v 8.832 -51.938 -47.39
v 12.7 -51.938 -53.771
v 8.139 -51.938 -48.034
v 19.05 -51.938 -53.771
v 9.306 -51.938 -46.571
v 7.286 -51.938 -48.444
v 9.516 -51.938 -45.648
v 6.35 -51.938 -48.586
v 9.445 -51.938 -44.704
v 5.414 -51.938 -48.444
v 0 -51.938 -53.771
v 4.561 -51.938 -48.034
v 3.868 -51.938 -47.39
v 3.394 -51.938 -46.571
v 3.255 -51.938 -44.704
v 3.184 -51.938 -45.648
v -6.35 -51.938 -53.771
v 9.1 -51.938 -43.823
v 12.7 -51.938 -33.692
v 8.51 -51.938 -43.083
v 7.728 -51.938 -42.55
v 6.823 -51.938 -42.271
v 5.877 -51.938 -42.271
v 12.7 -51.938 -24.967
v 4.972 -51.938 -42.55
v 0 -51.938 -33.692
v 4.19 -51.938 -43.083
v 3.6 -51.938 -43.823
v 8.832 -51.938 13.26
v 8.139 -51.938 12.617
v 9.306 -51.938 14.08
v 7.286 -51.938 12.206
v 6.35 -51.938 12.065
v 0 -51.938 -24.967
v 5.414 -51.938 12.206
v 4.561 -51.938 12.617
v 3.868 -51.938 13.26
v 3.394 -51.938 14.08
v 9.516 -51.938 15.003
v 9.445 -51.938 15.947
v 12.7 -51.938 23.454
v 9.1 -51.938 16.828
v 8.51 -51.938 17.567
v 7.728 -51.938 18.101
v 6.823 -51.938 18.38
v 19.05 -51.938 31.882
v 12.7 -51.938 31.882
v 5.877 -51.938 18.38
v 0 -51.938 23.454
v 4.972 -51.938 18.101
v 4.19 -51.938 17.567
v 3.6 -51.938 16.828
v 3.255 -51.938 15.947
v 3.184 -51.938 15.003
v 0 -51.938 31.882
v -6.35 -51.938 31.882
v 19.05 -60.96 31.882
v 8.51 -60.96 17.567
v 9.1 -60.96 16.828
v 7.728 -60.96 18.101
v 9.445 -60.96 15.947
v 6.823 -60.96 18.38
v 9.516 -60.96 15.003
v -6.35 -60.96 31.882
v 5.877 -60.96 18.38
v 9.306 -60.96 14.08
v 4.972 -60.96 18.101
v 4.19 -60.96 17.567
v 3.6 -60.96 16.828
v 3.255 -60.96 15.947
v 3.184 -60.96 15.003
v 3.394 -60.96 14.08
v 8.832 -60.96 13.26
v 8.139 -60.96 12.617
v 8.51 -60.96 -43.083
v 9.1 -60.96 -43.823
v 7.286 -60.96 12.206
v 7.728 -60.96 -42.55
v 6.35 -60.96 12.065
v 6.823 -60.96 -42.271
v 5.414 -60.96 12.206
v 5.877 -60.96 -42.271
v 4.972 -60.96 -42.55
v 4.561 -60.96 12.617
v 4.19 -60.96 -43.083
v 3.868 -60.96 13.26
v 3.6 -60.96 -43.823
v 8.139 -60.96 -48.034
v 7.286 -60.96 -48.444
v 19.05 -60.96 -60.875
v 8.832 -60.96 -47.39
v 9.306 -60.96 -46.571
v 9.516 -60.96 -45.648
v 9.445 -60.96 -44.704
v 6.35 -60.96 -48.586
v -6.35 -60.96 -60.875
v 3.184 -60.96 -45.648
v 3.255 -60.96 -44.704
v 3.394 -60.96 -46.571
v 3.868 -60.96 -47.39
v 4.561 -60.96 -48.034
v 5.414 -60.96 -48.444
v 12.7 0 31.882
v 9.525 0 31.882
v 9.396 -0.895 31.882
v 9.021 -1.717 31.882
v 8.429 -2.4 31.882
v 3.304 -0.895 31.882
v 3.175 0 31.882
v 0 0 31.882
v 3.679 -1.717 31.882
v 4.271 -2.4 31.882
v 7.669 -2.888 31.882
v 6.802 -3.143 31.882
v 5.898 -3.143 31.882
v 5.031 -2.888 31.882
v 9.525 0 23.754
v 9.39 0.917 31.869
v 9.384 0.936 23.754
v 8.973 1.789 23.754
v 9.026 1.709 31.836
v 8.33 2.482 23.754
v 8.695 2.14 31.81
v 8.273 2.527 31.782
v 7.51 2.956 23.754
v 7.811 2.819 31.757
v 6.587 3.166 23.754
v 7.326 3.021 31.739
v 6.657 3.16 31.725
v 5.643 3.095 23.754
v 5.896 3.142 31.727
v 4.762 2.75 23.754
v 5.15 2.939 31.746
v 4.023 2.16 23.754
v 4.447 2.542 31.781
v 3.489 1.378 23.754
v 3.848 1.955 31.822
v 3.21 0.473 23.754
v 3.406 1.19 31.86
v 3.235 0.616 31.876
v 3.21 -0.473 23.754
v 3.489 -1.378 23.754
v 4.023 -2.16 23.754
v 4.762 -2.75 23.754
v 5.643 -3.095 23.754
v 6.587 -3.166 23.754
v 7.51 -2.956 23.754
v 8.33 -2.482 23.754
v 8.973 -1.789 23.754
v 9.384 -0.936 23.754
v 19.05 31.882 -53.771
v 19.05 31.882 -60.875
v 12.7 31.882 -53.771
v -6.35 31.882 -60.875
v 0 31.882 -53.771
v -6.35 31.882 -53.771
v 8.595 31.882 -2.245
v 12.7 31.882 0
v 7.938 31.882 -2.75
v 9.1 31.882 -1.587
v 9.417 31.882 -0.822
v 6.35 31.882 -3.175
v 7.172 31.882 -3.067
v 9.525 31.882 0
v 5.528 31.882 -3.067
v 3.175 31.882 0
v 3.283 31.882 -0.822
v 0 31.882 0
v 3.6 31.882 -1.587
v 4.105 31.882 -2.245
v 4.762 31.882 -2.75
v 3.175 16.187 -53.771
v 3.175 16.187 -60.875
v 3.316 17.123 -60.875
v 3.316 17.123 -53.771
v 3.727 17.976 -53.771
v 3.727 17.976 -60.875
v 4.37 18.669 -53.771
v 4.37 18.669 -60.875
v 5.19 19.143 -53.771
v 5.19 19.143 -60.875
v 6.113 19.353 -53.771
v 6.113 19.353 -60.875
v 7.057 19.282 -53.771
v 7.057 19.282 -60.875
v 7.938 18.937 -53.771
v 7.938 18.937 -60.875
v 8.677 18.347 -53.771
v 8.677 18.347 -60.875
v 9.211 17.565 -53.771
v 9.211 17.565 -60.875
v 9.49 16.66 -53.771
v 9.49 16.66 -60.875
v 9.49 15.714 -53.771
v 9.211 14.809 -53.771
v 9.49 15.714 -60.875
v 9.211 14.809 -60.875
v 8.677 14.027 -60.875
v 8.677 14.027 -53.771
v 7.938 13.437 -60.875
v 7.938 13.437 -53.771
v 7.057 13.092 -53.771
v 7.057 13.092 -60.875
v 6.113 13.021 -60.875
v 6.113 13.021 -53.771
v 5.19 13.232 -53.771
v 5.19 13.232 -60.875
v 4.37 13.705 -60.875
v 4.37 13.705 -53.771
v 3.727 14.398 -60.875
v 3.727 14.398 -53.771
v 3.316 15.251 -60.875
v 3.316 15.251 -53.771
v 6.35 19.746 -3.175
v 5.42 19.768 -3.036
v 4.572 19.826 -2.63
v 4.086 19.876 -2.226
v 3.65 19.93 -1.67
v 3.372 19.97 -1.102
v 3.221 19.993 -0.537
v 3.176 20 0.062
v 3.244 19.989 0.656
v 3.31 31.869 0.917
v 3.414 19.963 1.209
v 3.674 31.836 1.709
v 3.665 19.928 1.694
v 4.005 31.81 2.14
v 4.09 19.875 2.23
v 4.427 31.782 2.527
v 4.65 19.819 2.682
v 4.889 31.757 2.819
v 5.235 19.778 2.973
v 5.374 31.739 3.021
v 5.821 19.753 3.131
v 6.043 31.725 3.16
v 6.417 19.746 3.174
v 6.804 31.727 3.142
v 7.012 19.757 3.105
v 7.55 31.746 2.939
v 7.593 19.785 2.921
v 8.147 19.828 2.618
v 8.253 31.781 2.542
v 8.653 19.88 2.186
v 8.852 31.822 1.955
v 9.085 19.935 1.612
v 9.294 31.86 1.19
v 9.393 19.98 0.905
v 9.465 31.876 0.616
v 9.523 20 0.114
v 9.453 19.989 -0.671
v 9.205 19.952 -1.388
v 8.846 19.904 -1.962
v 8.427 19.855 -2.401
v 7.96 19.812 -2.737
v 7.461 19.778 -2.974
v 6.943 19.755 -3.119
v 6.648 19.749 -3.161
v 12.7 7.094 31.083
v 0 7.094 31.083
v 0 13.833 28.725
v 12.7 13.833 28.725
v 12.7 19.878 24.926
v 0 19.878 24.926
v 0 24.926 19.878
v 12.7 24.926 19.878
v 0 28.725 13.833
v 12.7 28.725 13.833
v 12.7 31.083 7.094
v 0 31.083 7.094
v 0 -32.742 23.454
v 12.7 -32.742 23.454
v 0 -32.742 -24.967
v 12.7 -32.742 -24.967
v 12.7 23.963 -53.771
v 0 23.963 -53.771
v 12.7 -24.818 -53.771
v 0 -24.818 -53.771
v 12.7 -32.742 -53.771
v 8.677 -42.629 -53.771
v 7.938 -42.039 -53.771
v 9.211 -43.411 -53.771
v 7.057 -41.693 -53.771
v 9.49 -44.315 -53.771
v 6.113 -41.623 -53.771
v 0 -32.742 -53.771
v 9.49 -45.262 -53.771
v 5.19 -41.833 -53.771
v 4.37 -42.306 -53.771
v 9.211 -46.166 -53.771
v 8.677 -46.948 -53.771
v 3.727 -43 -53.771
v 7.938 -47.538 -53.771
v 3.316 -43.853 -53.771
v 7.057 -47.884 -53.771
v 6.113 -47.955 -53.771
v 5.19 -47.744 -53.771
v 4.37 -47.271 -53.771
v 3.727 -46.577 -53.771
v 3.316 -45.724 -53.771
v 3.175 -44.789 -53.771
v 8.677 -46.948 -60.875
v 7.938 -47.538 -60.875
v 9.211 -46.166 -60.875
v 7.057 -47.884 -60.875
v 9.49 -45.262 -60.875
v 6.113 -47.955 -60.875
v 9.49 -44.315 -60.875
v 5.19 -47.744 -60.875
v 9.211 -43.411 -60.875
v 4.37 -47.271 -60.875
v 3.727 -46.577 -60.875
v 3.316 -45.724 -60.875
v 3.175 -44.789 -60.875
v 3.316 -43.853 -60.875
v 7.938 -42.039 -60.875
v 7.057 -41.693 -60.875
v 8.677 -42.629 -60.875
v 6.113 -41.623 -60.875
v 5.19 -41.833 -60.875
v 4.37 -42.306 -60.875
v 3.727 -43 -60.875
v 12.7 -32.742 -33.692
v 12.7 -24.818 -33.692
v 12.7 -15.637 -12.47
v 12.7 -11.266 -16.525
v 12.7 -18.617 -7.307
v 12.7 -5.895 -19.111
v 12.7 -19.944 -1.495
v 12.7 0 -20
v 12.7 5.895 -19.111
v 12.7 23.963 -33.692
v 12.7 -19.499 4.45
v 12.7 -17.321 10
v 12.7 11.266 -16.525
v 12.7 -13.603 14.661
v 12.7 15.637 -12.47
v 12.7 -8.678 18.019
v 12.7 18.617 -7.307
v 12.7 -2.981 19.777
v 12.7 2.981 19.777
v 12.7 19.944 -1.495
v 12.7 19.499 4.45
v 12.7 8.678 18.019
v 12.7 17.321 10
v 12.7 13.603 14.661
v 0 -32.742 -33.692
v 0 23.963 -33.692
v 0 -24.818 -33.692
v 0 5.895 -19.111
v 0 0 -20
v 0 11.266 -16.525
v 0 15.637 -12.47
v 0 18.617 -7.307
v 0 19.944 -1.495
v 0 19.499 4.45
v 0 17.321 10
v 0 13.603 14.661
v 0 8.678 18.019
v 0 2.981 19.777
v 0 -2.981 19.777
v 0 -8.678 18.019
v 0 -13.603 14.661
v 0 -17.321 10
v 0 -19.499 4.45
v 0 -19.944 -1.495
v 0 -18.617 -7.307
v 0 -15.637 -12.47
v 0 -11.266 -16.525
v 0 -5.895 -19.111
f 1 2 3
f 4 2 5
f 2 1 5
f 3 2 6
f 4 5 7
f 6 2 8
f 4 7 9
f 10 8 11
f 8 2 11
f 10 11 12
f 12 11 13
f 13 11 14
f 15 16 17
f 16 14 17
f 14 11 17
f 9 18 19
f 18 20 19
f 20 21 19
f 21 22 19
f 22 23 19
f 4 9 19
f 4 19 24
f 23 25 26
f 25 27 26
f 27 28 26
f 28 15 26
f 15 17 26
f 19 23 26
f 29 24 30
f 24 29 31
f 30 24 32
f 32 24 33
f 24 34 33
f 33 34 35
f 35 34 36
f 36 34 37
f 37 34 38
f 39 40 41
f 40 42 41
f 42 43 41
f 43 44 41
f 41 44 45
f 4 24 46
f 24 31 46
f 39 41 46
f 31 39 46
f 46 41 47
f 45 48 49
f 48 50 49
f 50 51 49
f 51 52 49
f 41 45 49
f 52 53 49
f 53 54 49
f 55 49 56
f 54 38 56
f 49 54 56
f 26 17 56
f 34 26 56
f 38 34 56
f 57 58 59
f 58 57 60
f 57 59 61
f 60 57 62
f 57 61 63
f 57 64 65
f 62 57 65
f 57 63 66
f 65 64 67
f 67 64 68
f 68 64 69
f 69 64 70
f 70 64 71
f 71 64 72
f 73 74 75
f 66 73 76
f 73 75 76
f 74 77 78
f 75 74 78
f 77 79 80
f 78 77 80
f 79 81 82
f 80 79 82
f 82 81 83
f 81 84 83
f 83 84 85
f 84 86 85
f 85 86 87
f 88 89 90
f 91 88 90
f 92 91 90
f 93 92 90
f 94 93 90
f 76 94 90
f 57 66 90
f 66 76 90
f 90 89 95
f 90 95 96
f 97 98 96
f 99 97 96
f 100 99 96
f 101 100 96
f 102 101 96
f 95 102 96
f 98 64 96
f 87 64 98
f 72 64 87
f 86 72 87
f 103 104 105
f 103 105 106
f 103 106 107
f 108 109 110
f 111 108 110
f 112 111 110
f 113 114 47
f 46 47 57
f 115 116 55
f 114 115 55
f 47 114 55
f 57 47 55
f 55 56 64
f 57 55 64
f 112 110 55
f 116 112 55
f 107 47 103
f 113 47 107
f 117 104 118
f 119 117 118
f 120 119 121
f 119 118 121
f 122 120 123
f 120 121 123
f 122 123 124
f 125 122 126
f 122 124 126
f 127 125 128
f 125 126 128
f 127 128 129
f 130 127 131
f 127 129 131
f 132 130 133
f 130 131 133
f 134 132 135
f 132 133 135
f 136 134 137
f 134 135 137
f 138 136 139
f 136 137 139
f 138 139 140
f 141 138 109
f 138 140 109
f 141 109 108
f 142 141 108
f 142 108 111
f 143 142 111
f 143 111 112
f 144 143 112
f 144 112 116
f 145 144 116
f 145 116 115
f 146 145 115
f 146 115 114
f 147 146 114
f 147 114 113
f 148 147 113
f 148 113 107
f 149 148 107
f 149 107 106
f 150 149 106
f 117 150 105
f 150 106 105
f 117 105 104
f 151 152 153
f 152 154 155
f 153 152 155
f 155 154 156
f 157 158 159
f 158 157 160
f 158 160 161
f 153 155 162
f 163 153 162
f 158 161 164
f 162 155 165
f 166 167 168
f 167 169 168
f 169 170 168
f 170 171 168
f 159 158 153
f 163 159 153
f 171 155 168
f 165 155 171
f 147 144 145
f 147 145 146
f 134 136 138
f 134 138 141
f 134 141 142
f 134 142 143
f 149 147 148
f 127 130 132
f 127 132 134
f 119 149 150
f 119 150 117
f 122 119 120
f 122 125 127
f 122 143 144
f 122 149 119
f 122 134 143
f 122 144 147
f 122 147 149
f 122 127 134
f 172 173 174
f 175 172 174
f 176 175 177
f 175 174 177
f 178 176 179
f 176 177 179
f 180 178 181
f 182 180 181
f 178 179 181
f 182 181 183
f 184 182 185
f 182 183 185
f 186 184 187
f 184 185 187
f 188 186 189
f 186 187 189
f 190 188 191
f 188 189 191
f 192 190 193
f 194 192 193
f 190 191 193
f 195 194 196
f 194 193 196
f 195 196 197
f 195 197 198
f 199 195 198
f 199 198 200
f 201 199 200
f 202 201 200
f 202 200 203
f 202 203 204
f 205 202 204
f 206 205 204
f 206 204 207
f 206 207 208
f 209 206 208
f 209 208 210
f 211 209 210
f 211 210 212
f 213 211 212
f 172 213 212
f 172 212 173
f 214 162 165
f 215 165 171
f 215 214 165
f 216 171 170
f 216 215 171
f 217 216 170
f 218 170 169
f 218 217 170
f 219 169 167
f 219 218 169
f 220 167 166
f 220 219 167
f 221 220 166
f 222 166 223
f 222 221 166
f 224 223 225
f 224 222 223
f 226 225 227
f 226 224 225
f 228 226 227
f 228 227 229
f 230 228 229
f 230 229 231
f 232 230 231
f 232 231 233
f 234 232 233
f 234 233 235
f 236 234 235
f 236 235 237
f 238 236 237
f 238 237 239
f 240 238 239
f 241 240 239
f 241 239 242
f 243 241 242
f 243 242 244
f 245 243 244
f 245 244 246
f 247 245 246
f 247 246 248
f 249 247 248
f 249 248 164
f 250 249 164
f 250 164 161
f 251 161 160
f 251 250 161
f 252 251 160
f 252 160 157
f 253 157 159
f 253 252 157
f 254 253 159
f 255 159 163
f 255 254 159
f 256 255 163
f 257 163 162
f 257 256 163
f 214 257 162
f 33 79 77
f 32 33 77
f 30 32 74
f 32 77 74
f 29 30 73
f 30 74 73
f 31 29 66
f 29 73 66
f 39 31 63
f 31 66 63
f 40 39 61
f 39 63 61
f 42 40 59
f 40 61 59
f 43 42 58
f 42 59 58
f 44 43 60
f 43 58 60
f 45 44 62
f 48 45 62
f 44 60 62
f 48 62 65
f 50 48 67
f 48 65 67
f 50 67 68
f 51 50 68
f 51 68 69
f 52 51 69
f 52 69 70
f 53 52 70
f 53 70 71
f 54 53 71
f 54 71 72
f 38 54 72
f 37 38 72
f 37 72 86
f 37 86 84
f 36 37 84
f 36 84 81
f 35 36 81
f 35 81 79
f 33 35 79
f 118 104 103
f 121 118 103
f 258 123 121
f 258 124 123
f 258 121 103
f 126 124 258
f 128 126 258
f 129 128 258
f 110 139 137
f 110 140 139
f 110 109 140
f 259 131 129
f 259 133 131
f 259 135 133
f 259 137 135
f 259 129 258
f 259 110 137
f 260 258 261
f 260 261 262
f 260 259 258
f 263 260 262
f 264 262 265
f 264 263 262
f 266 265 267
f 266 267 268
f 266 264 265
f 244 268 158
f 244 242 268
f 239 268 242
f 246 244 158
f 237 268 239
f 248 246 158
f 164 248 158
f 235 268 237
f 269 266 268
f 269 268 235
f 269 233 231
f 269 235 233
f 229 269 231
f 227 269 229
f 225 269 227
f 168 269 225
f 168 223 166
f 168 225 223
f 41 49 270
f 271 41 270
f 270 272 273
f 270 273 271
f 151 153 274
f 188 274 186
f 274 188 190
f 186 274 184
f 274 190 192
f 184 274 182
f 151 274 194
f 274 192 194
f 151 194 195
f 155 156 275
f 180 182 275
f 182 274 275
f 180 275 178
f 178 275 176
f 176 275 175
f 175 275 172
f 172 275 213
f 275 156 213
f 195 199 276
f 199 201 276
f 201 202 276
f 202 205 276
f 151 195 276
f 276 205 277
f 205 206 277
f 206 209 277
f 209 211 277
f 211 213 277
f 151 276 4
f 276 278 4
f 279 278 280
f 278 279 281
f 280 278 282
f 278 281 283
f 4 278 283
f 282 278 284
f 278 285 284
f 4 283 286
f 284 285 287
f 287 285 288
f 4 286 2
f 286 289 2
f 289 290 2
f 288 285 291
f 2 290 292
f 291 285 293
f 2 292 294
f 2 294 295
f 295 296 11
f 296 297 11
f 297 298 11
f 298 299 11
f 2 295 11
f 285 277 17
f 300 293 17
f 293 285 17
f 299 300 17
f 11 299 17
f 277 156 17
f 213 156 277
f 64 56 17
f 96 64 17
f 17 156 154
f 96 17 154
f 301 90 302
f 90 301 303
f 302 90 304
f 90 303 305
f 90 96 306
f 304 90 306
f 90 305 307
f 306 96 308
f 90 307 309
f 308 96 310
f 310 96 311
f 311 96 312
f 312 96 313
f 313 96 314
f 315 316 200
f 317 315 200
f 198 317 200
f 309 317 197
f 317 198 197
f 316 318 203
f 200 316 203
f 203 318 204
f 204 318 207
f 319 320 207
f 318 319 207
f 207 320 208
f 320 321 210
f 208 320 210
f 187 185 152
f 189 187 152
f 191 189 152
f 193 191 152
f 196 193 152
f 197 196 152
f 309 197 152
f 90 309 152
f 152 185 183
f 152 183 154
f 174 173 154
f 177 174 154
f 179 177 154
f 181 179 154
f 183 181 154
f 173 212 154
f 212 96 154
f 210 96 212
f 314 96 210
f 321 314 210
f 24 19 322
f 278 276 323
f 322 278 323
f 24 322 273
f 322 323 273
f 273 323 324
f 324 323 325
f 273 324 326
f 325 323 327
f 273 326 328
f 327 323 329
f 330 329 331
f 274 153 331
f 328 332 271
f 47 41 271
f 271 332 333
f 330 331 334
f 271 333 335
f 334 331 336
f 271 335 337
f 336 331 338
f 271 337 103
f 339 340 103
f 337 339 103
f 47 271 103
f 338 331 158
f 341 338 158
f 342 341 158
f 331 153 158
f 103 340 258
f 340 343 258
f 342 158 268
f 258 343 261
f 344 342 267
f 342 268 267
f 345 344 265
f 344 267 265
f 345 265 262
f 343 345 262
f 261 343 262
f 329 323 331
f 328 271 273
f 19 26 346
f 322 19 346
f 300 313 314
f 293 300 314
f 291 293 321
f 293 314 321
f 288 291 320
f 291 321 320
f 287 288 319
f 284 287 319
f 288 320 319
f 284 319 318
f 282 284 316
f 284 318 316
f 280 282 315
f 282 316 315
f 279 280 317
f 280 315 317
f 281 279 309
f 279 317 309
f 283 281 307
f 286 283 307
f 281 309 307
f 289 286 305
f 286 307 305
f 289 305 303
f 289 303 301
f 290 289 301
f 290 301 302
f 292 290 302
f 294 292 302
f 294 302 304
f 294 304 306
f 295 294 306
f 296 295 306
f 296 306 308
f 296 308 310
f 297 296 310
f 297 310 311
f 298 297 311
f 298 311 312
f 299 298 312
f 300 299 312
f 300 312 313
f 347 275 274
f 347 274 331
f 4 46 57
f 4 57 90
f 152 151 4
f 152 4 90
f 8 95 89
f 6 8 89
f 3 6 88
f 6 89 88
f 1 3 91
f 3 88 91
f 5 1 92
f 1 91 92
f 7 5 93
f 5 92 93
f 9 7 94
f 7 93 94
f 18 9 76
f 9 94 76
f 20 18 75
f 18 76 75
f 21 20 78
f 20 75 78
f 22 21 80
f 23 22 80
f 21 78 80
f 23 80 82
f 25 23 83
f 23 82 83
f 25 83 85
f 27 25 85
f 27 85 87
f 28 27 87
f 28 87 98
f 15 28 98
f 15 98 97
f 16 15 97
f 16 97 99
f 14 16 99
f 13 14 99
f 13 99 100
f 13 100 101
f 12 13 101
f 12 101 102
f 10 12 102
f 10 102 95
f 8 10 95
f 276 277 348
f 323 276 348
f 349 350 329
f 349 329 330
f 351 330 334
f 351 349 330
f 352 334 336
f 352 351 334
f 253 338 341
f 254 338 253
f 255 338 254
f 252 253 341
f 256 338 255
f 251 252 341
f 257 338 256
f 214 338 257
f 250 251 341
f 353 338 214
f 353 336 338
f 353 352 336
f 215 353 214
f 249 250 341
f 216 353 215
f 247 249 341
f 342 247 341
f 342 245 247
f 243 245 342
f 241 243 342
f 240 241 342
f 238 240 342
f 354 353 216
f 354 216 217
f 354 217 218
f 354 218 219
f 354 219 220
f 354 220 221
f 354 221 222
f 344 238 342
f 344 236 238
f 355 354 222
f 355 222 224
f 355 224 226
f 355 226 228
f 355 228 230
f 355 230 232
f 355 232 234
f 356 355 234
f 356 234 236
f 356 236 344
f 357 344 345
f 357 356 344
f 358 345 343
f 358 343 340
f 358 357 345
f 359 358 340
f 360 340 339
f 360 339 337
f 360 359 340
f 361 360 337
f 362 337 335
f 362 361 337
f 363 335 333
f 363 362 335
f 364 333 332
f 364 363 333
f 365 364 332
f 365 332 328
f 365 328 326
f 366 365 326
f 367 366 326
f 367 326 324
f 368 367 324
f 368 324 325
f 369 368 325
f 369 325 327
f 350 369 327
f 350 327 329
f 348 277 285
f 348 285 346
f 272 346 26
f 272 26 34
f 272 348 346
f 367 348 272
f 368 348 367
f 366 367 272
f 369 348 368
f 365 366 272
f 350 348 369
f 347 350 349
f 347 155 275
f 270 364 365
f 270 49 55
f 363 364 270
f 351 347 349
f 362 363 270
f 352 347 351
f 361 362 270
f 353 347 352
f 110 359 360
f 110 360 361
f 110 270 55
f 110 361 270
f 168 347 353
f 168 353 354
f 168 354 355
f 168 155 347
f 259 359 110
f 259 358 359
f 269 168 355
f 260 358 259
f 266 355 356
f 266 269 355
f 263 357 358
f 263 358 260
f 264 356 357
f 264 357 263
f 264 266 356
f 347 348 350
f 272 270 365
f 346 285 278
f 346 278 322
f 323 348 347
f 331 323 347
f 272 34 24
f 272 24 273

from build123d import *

# Parameters (mm, degrees)
SKETCH1_R                = 20
BOSS_EXTRUDE1_DEPTH      = 12.7
BOSS_EXTRUDE2_DEPTH      = 6.35
BOSS_EXTRUDE2_DEPTH_BACK = 19.05
SKETCH2_R                = 3.175
CUT_EXTRUDE1_DEPTH       = 89.231203407
SKETCH10_R               = 3.175
CUT_EXTRUDE6_DEPTH       = 8.128
SKETCH4_W                = 20.078494948
SKETCH4_H                = 48.78095735
SKETCH4_W_2              = 48.420880553
SKETCH4_H_2              = 19.195923741
CUT_EXTRUDE2_DEPTH       = 26.162
SKETCH5_R                = 3.175
CUT_EXTRUDE3_DEPTH       = 11.43
SKETCH6_R                = 3.175
CUT_EXTRUDE4_DEPTH       = 11.43


with BuildPart() as part:
    # Sketch1 → Boss-Extrude1 (new body)
    with BuildSketch(Plane(origin=(0, 0, 0), x_dir=(0, 0, -1), z_dir=(1, 0, 0))):
        with BuildLine():
            Line((0, 31.882172919), (31.882172919, 31.882172919))
            Line((31.882172919, 31.882172919), (60.87463474, 31.882172919))
            Line((60.87463474, 31.882172919), (60.87463474, -60.96))
            Line((60.87463474, -60.96), (-31.882172919, -60.96))
            Line((-31.882172919, -60.96), (-31.882172919, 0))
            ThreePointArc((-31.882172919, 0), (-22.54410067, 22.54410067), (0, 31.882172919))
        make_face()
        Circle(SKETCH1_R, mode=Mode.SUBTRACT)
    extrude(amount=BOSS_EXTRUDE1_DEPTH)

    # Sketch8 → Boss-Extrude2 (add, two sides: drawn at the far end of the back side and taken through both)
    with BuildSketch(Plane(origin=(12.7, 0, 0), x_dir=(0, 0, -1), z_dir=(1, 0, 0)).offset(-BOSS_EXTRUDE2_DEPTH_BACK)):
        Polygon((60.87463474, 31.882172919), (53.770648903, 31.882172919), (53.770648903, -51.937867719), (-31.882172919, -51.937867719), (-31.882172919, -60.96), (53.770648903, -60.96), (60.87463474, -60.96), align=None)
    extrude(amount=BOSS_EXTRUDE2_DEPTH + BOSS_EXTRUDE2_DEPTH_BACK)

    # Sketch2 → Cut-Extrude1 (cut, through all)
    with BuildSketch(Plane(origin=(0, 0, 0), x_dir=(1, 0, 0), z_dir=(0, 1, 0))):
        with Locations((6.35, 0)):
            Circle(SKETCH2_R)
    extrude(amount=CUT_EXTRUDE1_DEPTH, mode=Mode.SUBTRACT)

    # Sketch10 → Cut-Extrude6 (cut)
    with BuildSketch(Plane.XY.offset(31.882172919)):
        with Locations((6.35, 0)):
            Circle(SKETCH10_R)
    extrude(amount=-CUT_EXTRUDE6_DEPTH, mode=Mode.SUBTRACT)

    # Sketch4 → Cut-Extrude2 (cut)
    with BuildSketch(Plane.ZY):
        with Locations((-43.731401429, -0.427222634)):
            Rectangle(SKETCH4_W, SKETCH4_H)
        with Locations((-0.75610861, -42.339905849)):
            Rectangle(SKETCH4_W_2, SKETCH4_H_2)
        with Locations((-43.731401429, -42.339905849)):
            Rectangle(SKETCH4_W, SKETCH4_H_2)
    extrude(amount=-CUT_EXTRUDE2_DEPTH, mode=Mode.SUBTRACT)

    # Sketch5 → Cut-Extrude3 (cut)
    with BuildSketch(Plane(origin=(0, 0, -60.87463474), x_dir=(-1, 0, 0), z_dir=(0, 0, -1))):
        with Locations((-6.35, 16.187024645)):
            Circle(SKETCH5_R)
        with Locations((-6.35, -44.788648077)):
            Circle(SKETCH5_R)
    extrude(amount=-CUT_EXTRUDE3_DEPTH, mode=Mode.SUBTRACT)

    # Sketch6 → Cut-Extrude4 (cut)
    with BuildSketch(Plane.XZ.offset(60.96)):
        with Locations((6.35, 15.24)):
            Circle(SKETCH6_R)
        with Locations((6.35, -45.41055385)):
            Circle(SKETCH6_R)
    extrude(amount=-CUT_EXTRUDE4_DEPTH, mode=Mode.SUBTRACT)


solid = part.part
